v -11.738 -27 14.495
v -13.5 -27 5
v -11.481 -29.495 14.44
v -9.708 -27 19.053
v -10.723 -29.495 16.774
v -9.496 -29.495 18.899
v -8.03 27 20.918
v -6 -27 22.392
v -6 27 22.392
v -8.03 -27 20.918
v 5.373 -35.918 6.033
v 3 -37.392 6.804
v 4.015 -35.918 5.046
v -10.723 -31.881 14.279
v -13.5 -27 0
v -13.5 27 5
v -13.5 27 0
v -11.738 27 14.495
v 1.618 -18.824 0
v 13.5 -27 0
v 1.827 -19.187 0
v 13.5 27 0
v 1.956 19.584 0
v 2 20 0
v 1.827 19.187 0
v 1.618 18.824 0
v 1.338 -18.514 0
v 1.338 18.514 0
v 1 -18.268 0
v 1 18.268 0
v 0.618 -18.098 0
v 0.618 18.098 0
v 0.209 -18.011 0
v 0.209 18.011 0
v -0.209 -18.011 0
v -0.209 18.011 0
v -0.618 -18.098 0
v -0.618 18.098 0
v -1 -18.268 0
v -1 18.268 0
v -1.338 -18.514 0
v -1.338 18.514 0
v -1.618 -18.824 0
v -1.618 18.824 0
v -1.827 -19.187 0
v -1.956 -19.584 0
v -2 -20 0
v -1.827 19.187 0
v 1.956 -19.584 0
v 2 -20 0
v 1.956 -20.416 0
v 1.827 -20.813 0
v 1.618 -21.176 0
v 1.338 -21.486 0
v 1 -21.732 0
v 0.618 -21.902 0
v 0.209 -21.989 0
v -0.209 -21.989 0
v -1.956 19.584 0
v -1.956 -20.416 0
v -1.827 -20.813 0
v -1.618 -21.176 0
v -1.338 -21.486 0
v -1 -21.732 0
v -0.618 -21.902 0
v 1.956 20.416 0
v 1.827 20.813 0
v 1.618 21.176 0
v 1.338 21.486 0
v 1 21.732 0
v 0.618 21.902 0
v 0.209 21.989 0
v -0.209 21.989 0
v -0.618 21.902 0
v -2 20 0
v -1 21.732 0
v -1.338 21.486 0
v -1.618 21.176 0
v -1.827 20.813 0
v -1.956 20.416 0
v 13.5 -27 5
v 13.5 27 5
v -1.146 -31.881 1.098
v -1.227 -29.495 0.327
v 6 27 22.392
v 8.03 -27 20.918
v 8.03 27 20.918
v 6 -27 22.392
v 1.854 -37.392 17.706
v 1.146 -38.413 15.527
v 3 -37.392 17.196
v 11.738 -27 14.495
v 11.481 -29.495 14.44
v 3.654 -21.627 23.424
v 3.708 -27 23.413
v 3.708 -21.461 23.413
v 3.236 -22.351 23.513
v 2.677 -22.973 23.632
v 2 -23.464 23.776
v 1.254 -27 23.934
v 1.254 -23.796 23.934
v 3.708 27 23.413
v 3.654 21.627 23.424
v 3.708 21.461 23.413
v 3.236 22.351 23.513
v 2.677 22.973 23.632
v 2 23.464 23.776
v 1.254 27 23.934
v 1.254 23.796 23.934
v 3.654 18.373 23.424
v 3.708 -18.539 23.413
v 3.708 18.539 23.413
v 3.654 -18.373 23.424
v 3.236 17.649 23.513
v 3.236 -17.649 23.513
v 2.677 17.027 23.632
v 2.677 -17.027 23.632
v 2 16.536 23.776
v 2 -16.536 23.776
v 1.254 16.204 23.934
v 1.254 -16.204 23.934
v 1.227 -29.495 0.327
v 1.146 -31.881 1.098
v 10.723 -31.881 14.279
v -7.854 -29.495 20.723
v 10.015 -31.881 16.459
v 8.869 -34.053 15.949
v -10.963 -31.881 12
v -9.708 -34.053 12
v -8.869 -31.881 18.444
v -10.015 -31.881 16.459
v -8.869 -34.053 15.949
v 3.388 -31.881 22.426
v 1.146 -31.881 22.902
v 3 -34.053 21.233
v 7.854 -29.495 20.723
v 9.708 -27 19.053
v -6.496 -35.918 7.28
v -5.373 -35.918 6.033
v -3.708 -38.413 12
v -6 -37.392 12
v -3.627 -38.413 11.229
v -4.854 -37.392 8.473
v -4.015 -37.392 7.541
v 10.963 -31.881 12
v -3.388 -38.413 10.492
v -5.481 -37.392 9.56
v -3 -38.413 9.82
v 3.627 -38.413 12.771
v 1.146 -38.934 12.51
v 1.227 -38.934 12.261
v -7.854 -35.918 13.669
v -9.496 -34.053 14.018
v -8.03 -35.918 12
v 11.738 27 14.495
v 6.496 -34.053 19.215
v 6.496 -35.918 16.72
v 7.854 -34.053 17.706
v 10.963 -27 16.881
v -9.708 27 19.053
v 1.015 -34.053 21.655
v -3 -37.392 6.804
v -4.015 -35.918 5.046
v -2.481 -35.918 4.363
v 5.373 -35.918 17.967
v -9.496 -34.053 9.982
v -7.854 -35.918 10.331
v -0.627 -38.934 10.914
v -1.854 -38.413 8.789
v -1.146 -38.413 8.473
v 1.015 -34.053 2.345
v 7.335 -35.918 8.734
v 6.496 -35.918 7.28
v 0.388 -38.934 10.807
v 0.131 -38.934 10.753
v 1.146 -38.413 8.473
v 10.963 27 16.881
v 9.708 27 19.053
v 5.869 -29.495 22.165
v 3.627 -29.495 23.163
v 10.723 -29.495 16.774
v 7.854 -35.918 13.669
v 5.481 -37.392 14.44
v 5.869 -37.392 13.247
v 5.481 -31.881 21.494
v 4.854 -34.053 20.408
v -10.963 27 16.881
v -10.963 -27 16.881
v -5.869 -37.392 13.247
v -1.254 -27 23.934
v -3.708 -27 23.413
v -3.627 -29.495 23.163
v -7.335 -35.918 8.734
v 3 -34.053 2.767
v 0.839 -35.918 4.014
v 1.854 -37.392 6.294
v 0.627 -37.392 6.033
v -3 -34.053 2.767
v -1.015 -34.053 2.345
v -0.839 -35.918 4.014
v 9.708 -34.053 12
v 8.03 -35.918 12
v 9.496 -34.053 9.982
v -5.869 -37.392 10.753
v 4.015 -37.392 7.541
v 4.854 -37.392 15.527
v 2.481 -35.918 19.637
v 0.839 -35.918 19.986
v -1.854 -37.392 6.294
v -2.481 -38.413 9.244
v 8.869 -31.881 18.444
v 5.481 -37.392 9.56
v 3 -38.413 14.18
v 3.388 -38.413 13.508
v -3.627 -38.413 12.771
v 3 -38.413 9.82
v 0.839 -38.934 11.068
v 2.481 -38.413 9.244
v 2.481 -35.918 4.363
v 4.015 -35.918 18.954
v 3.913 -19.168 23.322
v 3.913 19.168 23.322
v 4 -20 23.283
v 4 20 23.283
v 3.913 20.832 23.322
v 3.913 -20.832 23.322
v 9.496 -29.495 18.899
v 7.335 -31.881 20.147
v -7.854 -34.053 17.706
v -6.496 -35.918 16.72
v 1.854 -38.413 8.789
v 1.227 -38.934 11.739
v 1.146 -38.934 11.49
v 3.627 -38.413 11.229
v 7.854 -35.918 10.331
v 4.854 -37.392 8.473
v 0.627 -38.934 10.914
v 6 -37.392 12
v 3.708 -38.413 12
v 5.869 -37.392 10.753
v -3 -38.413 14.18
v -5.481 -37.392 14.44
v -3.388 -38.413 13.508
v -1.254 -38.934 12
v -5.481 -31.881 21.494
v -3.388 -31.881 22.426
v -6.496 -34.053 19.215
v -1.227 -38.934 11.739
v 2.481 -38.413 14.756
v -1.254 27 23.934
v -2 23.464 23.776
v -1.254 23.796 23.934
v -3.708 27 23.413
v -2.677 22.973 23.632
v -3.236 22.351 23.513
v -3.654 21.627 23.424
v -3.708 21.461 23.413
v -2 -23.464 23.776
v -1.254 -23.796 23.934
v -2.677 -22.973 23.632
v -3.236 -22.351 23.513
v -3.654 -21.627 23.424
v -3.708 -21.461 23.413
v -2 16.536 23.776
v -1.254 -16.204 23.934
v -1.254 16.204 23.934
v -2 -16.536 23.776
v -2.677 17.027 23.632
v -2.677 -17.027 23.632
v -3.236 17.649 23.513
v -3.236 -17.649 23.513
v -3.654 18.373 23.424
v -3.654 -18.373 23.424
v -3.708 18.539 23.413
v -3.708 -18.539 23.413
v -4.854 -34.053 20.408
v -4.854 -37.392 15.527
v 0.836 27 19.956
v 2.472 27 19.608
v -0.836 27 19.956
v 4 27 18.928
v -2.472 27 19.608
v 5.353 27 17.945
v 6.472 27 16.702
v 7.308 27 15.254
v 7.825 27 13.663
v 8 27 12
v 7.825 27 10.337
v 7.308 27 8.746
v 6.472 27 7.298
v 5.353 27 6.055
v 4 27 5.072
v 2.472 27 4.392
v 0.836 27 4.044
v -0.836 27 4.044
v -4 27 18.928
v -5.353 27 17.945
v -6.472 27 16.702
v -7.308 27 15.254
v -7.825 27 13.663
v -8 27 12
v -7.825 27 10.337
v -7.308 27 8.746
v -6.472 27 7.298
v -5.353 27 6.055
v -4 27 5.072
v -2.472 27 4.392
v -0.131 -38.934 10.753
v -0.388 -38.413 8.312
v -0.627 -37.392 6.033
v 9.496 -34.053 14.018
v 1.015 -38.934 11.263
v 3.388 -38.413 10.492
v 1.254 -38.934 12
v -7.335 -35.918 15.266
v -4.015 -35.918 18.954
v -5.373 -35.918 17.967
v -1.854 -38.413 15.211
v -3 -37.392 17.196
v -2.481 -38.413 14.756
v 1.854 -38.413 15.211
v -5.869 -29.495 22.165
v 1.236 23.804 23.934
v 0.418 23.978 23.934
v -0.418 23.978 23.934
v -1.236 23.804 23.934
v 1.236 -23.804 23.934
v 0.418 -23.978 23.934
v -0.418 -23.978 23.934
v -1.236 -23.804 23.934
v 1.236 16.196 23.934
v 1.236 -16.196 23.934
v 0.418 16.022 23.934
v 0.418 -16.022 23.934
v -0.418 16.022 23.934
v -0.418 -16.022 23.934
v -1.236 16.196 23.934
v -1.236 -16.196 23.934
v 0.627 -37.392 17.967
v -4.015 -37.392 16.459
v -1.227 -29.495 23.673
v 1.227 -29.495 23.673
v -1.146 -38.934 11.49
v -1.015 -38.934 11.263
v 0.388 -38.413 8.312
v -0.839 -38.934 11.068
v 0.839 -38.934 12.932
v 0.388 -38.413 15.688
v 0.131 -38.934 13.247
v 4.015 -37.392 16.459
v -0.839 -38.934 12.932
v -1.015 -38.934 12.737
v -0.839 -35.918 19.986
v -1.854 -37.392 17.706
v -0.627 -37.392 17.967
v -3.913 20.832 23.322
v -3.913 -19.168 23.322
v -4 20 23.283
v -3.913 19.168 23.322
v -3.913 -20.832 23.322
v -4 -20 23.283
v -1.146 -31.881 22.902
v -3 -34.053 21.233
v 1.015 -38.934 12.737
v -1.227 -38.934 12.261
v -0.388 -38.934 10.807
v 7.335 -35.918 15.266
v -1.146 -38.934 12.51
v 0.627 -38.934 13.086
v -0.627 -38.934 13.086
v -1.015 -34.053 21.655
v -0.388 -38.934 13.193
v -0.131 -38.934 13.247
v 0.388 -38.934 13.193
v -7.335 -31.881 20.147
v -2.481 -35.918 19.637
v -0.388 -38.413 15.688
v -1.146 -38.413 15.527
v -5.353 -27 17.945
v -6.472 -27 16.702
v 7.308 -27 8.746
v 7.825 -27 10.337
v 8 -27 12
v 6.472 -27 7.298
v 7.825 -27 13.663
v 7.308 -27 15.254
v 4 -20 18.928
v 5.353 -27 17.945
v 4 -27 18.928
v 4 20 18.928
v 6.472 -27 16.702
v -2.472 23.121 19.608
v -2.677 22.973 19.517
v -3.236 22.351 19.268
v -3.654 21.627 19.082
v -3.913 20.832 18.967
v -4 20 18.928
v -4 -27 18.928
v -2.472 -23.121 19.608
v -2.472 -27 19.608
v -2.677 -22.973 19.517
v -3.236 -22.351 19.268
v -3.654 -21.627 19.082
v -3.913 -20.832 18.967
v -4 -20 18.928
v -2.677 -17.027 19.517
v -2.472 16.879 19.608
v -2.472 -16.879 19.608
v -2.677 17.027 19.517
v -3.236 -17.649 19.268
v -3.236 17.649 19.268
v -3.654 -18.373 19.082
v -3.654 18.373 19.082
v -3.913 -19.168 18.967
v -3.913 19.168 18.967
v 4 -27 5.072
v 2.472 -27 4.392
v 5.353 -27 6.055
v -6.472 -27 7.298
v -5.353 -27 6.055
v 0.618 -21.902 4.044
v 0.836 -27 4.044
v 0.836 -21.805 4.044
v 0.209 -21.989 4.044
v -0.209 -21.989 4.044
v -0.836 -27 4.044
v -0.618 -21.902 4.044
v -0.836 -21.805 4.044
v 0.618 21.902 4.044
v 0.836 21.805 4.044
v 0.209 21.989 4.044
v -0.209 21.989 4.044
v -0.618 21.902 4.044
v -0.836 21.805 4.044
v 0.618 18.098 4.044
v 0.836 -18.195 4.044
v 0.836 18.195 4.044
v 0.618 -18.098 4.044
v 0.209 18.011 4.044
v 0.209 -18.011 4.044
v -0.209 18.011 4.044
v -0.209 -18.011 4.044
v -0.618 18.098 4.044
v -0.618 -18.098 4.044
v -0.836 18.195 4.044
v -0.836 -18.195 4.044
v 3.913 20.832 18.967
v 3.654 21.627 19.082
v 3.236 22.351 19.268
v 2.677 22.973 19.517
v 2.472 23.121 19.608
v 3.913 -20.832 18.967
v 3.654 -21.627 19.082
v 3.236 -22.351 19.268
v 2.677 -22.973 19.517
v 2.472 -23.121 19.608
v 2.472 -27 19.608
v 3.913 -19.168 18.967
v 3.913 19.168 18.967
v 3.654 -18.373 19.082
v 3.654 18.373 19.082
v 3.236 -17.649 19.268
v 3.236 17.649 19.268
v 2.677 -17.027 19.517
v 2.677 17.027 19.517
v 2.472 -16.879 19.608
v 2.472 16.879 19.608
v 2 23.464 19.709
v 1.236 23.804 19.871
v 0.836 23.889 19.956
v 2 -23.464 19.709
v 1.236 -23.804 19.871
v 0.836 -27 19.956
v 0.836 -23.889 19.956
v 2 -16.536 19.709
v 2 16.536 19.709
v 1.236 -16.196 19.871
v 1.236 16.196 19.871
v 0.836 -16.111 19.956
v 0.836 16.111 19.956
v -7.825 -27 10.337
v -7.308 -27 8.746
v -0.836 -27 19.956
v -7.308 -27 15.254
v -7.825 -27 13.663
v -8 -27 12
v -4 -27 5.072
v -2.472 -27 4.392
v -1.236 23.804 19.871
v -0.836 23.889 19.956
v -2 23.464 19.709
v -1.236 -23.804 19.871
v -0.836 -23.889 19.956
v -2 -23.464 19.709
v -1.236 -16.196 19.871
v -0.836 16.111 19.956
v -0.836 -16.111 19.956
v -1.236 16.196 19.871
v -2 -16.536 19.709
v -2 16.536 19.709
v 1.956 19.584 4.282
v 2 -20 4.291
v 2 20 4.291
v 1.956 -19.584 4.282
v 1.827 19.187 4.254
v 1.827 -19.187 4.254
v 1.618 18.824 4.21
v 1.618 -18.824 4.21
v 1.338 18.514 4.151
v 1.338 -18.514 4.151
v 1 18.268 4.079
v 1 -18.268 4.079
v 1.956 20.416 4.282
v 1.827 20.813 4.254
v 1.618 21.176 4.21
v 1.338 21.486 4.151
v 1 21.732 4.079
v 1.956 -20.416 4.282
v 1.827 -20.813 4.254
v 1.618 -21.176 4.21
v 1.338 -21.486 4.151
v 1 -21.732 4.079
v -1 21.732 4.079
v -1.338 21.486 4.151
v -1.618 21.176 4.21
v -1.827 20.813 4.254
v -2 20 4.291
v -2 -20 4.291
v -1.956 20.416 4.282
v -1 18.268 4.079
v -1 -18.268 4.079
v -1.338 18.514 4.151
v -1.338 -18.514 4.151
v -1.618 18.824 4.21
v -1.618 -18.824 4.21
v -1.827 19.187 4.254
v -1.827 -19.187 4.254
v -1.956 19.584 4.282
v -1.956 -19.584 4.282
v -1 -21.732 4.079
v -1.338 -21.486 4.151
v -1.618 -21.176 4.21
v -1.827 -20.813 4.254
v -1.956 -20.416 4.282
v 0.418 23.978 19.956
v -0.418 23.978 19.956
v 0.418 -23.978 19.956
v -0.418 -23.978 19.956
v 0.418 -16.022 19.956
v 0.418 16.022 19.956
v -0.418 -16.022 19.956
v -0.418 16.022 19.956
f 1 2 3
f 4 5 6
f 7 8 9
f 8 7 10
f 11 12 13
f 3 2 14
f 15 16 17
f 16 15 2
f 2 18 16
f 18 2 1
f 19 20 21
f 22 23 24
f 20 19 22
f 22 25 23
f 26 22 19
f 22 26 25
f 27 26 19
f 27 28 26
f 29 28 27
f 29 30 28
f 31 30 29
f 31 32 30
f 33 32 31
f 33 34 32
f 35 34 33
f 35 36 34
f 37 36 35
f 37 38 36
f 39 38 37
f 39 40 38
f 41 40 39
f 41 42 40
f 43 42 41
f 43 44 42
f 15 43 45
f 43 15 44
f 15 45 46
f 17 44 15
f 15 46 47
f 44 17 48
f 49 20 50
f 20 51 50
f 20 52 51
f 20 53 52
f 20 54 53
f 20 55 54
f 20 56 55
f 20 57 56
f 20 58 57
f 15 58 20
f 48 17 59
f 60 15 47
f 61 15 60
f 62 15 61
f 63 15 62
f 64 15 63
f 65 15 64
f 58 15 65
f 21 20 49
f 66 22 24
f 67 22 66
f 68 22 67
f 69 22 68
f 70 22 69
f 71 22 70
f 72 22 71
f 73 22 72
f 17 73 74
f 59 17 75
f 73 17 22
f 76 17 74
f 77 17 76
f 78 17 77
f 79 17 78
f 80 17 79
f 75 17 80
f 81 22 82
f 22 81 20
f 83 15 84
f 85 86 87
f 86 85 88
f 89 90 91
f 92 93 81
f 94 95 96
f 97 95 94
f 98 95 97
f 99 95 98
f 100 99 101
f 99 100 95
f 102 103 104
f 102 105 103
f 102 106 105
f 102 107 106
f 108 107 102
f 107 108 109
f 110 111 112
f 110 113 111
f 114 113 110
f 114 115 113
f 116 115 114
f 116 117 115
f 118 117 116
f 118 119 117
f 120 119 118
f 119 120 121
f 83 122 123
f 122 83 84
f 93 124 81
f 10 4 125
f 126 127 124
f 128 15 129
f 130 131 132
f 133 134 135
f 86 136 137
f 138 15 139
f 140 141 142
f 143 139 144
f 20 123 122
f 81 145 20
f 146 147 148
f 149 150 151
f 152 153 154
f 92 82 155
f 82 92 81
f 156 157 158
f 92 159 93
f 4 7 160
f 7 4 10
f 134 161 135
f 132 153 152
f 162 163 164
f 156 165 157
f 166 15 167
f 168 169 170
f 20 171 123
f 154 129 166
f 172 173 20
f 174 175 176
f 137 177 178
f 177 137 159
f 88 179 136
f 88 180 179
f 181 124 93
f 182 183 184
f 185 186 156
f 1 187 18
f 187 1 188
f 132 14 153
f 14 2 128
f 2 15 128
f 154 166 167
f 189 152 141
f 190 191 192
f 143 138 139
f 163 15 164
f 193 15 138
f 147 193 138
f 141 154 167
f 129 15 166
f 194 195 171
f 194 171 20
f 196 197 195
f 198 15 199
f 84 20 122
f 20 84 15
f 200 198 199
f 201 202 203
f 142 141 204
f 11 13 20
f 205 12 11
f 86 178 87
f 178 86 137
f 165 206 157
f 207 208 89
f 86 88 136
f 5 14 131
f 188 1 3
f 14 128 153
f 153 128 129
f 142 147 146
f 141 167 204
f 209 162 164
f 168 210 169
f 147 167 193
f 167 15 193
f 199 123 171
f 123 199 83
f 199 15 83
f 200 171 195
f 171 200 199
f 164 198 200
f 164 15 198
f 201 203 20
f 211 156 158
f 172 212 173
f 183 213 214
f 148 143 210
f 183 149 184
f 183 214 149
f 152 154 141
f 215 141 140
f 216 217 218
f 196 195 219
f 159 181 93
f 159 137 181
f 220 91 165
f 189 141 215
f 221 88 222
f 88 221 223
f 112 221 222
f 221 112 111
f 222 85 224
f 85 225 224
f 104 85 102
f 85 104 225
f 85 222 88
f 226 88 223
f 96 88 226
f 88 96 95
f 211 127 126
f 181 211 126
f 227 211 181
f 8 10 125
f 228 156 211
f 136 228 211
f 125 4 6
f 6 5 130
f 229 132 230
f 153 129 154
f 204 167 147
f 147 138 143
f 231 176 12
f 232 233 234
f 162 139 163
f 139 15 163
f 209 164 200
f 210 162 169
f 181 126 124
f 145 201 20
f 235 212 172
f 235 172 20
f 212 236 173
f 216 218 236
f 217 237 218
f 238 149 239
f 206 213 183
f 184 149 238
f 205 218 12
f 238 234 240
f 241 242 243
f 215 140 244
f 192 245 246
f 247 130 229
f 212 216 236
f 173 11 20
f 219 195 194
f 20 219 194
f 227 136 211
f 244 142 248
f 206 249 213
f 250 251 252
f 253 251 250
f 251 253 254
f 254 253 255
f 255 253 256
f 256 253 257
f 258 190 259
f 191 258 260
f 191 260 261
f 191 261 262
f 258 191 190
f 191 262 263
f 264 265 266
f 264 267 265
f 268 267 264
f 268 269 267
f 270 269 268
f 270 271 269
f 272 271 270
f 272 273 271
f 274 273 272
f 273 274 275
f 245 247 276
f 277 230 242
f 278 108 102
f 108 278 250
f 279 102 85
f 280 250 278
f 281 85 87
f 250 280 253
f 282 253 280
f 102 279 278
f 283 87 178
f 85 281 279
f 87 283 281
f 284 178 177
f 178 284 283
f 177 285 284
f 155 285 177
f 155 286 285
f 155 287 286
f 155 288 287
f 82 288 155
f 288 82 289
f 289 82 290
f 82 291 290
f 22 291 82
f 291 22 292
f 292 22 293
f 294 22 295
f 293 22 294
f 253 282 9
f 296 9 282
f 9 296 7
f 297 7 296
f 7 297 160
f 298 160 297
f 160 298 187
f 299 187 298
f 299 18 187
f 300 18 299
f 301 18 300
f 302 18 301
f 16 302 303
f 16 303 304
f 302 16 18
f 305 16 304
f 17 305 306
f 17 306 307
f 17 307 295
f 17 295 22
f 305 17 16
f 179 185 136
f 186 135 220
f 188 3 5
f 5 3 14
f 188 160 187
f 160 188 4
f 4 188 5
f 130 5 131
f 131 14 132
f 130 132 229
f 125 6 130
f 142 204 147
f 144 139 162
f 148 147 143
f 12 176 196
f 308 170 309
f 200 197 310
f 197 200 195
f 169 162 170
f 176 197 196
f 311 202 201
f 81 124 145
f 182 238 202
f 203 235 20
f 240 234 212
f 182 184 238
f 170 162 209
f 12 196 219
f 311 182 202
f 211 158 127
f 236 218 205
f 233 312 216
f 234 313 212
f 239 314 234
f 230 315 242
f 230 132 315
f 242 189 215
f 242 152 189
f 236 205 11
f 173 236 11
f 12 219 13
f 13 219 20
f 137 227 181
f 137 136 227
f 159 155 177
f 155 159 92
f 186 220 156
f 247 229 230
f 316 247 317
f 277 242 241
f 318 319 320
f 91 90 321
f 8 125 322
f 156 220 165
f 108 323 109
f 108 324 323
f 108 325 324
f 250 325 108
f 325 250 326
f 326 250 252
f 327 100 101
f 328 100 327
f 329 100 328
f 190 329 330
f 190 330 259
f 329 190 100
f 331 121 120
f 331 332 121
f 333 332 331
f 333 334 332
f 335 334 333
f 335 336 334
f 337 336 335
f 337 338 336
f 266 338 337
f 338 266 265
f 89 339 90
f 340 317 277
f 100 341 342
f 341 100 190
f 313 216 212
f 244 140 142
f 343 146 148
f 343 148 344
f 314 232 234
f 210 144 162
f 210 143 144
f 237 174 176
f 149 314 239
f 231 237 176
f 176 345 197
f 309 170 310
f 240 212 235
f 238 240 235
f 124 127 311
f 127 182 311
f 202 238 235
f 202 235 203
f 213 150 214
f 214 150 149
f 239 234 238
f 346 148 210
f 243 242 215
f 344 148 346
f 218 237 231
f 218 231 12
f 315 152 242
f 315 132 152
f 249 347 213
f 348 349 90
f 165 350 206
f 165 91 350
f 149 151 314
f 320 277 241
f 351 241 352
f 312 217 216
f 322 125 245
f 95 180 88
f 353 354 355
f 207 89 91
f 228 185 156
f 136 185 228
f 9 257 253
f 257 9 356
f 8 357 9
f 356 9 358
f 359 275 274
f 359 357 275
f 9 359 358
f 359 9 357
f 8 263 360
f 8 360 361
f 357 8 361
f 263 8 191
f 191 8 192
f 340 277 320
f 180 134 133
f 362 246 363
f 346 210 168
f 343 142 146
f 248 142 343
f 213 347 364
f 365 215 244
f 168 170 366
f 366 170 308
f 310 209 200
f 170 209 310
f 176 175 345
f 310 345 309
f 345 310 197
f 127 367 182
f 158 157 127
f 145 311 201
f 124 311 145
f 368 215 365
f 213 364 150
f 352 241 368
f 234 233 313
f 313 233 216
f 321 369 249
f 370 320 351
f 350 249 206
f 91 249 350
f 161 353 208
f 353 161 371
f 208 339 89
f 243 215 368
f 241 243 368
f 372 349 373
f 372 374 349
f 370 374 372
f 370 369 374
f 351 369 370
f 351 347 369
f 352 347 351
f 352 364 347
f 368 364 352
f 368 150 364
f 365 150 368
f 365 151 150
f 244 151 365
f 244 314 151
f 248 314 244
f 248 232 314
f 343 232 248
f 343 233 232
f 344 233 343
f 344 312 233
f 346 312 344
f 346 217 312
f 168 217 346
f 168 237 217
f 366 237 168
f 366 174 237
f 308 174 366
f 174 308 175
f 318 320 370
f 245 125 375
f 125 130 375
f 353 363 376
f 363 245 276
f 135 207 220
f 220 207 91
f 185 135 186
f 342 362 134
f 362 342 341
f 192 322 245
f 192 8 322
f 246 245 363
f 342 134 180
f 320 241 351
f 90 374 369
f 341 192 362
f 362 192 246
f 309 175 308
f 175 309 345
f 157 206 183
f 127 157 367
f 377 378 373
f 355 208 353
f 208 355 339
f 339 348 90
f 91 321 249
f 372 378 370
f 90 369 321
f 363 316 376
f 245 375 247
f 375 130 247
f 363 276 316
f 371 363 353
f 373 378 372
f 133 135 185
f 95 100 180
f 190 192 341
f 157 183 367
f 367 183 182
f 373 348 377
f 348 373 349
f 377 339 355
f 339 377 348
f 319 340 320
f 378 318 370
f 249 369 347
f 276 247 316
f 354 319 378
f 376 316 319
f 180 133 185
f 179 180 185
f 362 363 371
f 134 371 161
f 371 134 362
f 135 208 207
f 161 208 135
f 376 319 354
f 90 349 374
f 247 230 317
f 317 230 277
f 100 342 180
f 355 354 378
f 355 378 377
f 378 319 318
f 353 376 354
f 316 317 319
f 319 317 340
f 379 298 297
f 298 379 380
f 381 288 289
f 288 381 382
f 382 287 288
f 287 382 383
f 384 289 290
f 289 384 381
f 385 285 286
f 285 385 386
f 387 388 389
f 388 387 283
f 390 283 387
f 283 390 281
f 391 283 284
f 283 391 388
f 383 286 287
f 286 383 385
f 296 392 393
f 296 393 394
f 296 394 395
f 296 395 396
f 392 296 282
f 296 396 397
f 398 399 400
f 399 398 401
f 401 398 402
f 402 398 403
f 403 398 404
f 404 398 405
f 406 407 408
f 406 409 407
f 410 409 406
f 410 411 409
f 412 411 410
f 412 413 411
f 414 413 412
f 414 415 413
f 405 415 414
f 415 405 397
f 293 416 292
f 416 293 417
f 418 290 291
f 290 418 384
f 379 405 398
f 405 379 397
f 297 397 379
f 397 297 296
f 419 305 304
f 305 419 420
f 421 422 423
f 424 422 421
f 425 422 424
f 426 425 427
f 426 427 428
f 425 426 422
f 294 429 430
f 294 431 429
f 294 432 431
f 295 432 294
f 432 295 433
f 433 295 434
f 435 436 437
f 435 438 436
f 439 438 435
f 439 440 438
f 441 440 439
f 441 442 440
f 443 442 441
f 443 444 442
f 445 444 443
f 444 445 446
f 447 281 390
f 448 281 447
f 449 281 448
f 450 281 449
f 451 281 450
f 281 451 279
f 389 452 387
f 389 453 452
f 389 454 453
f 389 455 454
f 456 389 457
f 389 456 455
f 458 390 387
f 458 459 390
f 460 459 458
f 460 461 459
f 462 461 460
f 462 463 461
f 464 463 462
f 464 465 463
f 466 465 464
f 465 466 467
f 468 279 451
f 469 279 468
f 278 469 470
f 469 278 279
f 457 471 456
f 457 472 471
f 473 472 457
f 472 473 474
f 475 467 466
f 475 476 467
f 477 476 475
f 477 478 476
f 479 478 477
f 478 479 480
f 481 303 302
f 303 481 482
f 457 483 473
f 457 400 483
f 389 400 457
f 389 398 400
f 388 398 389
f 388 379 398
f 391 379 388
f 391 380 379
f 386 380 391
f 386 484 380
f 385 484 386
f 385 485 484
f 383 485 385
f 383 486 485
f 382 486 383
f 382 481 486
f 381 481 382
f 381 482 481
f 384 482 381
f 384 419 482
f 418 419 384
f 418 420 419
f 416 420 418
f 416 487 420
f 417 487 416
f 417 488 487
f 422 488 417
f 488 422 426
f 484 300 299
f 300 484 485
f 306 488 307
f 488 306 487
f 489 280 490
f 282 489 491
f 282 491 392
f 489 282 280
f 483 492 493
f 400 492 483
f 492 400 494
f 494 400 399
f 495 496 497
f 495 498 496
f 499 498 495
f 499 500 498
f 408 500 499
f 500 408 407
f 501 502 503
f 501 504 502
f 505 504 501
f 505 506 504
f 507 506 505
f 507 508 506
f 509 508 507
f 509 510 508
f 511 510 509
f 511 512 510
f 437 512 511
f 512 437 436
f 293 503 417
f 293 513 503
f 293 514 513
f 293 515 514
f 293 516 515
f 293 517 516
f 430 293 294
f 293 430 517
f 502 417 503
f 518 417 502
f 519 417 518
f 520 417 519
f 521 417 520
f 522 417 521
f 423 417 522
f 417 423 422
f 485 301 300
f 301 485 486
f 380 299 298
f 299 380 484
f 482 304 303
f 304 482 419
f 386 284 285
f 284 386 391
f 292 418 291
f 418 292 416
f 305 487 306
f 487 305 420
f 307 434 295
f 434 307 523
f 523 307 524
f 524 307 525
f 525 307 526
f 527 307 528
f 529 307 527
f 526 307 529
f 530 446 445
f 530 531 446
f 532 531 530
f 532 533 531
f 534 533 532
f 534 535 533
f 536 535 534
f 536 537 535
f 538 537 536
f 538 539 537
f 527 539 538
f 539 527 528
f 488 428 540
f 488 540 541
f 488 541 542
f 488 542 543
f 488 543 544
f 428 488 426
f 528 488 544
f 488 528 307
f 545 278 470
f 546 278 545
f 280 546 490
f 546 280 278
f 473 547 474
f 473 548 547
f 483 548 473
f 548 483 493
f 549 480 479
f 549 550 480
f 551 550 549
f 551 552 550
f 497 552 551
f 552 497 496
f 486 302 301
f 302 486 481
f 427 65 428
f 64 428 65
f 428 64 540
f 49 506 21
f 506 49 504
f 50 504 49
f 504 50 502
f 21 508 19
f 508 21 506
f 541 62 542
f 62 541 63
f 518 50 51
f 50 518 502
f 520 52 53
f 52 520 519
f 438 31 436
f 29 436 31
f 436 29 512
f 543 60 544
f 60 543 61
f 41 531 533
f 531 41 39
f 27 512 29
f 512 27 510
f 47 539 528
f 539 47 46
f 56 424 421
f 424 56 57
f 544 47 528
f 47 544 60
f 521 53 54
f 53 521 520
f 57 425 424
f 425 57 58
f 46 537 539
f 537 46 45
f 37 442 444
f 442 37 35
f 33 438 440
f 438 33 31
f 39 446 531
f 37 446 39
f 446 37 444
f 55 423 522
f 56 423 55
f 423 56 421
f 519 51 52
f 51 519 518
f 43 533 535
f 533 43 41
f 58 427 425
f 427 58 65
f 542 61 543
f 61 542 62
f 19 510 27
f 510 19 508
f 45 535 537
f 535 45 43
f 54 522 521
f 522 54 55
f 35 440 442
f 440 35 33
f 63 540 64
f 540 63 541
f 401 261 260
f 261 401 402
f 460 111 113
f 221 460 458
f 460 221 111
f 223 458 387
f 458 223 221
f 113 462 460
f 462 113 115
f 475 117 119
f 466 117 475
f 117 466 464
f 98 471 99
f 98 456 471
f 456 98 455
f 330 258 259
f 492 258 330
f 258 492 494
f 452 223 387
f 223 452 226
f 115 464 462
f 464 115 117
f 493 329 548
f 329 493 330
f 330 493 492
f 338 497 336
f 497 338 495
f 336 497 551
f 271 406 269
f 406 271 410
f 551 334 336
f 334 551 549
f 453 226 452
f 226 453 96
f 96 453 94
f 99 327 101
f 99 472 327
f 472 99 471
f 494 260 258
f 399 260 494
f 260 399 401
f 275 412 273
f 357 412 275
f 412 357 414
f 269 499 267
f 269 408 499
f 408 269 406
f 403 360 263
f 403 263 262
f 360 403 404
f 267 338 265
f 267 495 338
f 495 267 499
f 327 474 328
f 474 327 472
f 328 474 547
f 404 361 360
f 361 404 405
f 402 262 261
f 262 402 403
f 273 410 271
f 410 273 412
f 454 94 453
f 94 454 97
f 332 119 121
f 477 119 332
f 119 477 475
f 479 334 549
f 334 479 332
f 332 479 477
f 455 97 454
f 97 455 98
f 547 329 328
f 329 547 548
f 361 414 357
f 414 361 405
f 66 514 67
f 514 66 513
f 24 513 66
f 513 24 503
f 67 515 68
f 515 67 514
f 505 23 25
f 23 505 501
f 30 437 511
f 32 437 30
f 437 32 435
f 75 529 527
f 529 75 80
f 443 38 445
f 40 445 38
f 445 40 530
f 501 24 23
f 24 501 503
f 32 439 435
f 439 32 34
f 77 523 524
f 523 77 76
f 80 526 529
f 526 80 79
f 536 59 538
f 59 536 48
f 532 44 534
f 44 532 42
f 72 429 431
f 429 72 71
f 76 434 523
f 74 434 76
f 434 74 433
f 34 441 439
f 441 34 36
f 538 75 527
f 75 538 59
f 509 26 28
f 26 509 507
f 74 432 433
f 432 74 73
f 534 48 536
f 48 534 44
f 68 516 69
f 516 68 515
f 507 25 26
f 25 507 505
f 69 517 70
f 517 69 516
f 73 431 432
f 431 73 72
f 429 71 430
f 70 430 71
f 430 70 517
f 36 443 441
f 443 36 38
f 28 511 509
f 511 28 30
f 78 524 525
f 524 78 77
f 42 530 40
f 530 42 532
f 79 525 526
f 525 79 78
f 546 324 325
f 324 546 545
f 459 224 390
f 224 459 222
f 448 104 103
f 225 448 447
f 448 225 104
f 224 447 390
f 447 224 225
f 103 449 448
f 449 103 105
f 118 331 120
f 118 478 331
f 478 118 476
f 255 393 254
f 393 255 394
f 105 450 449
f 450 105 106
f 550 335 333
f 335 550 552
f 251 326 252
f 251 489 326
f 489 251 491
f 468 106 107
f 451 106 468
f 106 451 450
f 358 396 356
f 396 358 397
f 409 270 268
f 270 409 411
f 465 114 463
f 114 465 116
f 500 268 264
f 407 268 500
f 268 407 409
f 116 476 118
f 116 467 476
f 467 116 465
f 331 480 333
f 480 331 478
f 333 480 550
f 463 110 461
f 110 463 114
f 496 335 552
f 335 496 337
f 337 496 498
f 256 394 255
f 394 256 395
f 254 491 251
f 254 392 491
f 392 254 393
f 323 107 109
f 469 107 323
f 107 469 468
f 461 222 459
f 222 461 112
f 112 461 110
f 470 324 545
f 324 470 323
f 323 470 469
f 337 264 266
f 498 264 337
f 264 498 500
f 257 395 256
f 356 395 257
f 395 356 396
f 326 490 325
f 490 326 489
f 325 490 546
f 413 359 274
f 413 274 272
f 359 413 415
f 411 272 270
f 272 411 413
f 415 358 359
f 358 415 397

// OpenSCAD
MOUNT_HOLE_SPACING = 40;
MOUNT_HOLE_DIA = 4;

WIDTH = MOUNT_HOLE_SPACING + MOUNT_HOLE_DIA + 10;

POLE_DIA = 16;
POLE_MOUNT_DIA = POLE_DIA + 8;
POLE_MOUNT_WIDTH = WIDTH/2;
POLE_MOUNT_LENGTH = WIDTH;
POLE_MOUNT_HEIGHT = 5;

$fn = 30;

module pole_mount() {
    difference() {
        hull() {
            translate([0, -POLE_MOUNT_LENGTH/2, POLE_MOUNT_DIA/2])
                rotate([-90, 0, 0])
                    union() {
                        cylinder(d = POLE_MOUNT_DIA, h = POLE_MOUNT_LENGTH);
                        sphere(d = POLE_MOUNT_DIA);
                    }
            translate([-POLE_MOUNT_WIDTH/2, -POLE_MOUNT_LENGTH/2, 0])
                cube(size = [POLE_MOUNT_WIDTH, POLE_MOUNT_LENGTH, POLE_MOUNT_HEIGHT]);
        }
        translate([0, -POLE_MOUNT_LENGTH/2, POLE_MOUNT_DIA/2])
            rotate([-90, 0, 0])
                cylinder(d = POLE_DIA, h = POLE_MOUNT_LENGTH);

    }
}

module mounting_holes() {
    height = (POLE_MOUNT_DIA + POLE_MOUNT_HEIGHT)/2;
    union() {
        for(i = [-1, 1]) {
            translate([0, i * MOUNT_HOLE_SPACING/2, 0])
                cylinder(d = MOUNT_HOLE_DIA, h = height);
            translate([0, i * MOUNT_HOLE_SPACING/2, height])
                cylinder(d = MOUNT_HOLE_DIA*2, h = height);
        }
    }
}

difference() {
    pole_mount();
    mounting_holes();
}
